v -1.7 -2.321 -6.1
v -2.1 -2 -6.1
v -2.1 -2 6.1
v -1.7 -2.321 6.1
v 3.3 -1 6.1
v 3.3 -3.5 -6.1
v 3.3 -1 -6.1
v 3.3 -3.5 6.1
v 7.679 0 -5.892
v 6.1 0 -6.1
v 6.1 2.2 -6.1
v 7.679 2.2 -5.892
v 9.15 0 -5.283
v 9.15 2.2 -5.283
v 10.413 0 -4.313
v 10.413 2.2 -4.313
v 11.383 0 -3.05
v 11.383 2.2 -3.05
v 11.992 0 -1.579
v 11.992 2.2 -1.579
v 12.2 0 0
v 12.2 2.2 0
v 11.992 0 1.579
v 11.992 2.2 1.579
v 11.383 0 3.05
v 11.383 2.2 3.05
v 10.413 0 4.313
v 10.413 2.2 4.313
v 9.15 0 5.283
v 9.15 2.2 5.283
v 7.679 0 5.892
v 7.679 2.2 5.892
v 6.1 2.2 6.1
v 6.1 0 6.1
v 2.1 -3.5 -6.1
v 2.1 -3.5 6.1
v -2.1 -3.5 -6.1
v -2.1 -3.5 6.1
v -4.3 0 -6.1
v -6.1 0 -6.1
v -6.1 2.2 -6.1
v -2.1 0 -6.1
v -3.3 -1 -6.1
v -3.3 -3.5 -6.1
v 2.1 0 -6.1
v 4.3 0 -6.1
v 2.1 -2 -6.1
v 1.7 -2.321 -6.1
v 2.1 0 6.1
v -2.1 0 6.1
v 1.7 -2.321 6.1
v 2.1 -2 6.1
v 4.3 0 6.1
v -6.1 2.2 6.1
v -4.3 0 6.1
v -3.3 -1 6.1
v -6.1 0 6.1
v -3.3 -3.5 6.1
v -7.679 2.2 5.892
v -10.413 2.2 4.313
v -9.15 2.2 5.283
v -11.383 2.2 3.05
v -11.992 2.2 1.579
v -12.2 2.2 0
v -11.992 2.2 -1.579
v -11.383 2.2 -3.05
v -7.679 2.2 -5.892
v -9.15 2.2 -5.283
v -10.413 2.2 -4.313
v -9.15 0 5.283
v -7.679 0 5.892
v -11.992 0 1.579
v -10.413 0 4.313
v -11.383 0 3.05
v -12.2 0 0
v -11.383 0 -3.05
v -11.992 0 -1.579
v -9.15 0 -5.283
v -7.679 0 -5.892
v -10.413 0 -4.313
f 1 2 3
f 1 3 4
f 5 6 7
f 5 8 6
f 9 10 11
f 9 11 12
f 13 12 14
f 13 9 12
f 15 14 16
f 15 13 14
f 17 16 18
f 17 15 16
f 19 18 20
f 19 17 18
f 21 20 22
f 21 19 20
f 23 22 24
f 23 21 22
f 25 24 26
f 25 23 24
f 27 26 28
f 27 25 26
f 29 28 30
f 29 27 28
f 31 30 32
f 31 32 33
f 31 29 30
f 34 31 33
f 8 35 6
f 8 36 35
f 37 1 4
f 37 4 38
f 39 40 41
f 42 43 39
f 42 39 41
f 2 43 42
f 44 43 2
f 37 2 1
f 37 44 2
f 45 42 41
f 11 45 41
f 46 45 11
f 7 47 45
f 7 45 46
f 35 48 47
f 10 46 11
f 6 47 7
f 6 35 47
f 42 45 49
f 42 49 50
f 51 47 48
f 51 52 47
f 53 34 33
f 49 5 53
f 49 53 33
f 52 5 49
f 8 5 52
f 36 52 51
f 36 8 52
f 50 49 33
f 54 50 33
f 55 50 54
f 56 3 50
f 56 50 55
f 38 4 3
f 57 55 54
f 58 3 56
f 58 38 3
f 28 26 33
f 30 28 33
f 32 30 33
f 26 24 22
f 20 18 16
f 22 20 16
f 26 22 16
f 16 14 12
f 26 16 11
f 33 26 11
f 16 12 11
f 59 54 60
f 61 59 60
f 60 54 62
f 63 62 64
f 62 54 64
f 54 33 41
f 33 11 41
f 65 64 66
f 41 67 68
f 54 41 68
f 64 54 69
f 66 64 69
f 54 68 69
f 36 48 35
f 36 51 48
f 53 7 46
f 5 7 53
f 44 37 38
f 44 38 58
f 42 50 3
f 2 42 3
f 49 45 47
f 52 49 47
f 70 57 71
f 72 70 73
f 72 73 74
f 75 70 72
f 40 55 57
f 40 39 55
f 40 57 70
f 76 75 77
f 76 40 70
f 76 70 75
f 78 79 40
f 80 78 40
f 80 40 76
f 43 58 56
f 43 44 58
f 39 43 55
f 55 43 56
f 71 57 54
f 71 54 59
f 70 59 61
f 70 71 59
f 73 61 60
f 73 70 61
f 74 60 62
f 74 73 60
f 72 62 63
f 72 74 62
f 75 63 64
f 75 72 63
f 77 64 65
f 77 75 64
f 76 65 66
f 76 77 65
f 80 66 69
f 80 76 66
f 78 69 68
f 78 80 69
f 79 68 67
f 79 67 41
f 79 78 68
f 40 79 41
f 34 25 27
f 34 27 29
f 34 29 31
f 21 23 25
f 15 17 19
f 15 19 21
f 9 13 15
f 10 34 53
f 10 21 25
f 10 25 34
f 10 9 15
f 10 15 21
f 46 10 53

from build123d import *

# Parameters (mm, degrees)
BOSS_EXTRU_1_DEPTH = 2.2
BOSS_EXTRU_2_DEPTH = 6.1
CHANFREIN1_SIZE    = 1


with BuildPart() as part:
    # Esquisse1 → Boss.-Extru.1 (new body)
    with BuildSketch(Plane(origin=(0, 0, 0), x_dir=(1, 0, 0), z_dir=(0, 1, 0))):
        with BuildLine():
            Line((-6.1, 6.1), (6.1, 6.1))
            ThreePointArc((6.1, 6.1), (12.2, 0), (6.1, -6.1))
            Line((6.1, -6.1), (-6.1, -6.1))
            ThreePointArc((-6.1, -6.1), (-12.2, 0), (-6.1, 6.1))
        make_face()
    extrude(amount=BOSS_EXTRU_1_DEPTH)

    # Esquisse2 → Boss.-Extru.2 (add, symmetric)
    with BuildSketch(Plane.XY):
        Polygon((-2.1, 0), (-2.1, -2), (-1.7, -2.32091043), (-2.1, -3.5), (-3.3, -3.5), (-3.3, 0), align=None)
        Polygon((2.1, -3.5), (3.3, -3.5), (3.3, 0), (2.1, 0), (2.1, -2), (1.7, -2.32091043), align=None)
    extrude(amount=BOSS_EXTRU_2_DEPTH, both=True)

    # Chanfrein1
    chanfrein1_edges = [part.edges().sort_by_distance(p)[0] for p in [
        (-3.3, 0, 0),
        (3.3, 0, 0),
    ]]
    chamfer(chanfrein1_edges, length=CHANFREIN1_SIZE)


solid = part.part
